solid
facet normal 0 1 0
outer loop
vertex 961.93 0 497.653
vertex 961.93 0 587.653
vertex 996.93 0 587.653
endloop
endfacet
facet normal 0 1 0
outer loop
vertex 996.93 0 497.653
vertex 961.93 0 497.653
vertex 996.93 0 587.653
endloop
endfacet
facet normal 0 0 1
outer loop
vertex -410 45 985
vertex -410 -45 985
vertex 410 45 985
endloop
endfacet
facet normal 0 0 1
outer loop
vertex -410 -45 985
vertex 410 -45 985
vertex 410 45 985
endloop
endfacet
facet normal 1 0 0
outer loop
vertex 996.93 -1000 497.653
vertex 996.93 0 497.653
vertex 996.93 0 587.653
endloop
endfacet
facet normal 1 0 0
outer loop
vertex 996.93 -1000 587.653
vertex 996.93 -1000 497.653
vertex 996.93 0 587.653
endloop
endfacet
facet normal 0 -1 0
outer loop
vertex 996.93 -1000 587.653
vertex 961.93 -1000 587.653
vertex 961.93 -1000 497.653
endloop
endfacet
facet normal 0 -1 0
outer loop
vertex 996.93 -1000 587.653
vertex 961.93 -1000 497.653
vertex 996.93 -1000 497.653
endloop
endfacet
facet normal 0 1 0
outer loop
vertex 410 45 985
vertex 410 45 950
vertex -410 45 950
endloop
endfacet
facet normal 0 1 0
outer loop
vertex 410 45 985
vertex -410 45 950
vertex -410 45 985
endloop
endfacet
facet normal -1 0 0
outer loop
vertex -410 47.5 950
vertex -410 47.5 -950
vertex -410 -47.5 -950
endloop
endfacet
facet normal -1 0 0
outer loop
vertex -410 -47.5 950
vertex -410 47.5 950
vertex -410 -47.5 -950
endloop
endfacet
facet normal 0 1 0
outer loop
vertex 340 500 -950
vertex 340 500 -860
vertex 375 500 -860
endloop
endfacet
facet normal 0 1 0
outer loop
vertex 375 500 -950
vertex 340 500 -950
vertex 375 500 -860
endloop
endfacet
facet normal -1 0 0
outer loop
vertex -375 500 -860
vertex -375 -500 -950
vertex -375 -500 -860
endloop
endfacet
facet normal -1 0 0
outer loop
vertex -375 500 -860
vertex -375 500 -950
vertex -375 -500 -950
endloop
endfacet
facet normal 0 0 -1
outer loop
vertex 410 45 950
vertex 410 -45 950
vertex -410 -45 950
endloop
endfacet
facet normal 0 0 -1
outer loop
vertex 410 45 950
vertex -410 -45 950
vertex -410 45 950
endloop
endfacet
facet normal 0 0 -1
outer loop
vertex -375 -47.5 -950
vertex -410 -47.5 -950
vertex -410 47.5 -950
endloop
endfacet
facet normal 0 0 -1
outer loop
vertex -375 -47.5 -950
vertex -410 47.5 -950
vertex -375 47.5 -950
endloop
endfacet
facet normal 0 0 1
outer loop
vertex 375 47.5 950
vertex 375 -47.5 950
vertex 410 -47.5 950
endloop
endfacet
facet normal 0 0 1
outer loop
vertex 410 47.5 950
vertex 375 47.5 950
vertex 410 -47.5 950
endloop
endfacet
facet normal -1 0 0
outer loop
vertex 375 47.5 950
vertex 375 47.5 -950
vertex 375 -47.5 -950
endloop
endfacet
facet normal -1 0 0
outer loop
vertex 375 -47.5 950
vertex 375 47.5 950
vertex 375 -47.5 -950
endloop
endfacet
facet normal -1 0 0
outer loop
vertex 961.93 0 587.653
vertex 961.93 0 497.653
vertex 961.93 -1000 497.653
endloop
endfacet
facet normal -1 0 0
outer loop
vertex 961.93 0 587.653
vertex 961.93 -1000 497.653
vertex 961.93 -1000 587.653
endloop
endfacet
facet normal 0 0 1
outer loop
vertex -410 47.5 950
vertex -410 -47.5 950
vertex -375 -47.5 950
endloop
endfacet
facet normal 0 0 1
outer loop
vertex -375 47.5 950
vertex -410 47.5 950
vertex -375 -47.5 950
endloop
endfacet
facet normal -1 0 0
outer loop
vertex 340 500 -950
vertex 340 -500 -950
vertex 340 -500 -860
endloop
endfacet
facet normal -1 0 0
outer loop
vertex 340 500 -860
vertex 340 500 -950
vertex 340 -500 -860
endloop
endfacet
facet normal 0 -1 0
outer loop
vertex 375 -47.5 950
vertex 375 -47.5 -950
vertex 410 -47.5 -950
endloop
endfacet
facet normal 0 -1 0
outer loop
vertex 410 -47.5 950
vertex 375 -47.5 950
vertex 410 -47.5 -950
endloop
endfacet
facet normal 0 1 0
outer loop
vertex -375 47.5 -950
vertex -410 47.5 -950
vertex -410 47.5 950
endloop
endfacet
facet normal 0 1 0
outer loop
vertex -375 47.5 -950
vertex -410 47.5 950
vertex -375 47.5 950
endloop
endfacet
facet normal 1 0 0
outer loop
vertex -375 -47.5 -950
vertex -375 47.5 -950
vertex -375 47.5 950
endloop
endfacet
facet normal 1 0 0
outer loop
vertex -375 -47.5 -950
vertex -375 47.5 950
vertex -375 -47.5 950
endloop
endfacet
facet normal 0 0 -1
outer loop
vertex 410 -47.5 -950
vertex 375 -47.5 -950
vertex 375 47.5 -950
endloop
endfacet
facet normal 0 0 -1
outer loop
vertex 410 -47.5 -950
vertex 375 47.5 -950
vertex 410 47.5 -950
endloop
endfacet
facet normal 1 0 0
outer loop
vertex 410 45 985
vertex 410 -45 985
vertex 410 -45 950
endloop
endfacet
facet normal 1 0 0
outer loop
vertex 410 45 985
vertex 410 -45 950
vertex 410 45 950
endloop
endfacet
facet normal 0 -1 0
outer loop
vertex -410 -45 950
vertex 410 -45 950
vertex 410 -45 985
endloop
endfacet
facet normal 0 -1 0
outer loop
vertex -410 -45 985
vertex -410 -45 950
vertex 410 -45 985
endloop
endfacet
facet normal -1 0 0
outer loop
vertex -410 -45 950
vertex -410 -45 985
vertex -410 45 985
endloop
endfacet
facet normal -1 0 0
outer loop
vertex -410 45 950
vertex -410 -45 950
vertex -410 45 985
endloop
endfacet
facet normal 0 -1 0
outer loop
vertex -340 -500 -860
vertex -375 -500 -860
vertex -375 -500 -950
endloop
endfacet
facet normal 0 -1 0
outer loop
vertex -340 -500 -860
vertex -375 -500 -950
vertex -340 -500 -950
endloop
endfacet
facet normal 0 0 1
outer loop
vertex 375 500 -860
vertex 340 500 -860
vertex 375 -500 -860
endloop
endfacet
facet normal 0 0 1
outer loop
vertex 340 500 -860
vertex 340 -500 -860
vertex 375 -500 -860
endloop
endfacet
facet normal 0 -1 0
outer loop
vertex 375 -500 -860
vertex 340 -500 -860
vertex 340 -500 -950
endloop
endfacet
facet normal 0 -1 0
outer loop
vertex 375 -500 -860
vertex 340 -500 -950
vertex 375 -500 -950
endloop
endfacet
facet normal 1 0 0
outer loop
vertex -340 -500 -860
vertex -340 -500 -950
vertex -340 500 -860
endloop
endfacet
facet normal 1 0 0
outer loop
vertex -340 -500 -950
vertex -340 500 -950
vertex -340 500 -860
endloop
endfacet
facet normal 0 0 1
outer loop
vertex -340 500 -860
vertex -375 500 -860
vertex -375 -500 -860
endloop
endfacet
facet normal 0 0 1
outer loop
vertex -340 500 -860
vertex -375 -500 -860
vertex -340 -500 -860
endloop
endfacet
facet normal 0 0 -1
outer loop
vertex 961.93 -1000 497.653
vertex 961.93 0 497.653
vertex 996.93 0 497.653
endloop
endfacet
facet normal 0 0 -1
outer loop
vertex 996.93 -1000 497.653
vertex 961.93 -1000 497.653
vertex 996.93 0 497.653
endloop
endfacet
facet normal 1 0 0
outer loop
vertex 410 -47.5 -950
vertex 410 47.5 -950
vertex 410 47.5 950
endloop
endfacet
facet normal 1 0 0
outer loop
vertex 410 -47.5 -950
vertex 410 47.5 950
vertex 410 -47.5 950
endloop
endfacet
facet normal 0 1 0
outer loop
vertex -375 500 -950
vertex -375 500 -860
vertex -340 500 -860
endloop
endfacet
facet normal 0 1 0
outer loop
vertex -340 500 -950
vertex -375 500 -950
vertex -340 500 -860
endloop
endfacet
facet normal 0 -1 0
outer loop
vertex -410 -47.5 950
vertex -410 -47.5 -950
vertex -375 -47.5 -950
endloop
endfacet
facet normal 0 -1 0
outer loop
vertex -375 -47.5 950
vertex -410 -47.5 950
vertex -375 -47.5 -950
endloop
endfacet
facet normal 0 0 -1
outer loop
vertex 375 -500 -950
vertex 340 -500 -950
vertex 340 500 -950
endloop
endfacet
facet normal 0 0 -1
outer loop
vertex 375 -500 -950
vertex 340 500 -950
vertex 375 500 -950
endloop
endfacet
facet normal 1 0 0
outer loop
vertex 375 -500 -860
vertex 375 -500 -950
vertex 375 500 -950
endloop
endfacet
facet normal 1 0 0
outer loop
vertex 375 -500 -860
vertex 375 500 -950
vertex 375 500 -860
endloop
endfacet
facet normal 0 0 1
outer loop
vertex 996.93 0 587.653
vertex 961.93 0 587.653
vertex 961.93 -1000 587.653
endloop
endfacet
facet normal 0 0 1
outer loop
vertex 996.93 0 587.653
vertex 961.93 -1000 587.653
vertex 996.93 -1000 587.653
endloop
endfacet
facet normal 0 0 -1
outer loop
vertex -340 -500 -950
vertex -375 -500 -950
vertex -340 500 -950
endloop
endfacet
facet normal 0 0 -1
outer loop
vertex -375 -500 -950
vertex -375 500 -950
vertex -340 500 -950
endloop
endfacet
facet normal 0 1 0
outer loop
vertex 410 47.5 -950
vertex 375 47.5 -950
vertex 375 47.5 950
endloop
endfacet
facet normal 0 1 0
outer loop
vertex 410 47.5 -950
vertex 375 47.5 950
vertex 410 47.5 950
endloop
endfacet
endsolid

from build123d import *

# Parameters (mm, degrees)
F0_W          = 35
F0_H          = 90
F1_DEPTH      = 1000
F2_DEPTH      = 500
F4_W          = 35
F4_H          = 95
F5_DEPTH      = 1900
F6_W          = 90
F6_H          = 35
F7_DEPTH      = 410
F7_DEPTH_BACK = 410


with BuildPart() as f1:
    # F0 (on Front) → F1 (new body)
    with BuildSketch(Plane.XZ):
        with Locations((979.430446, 542.652875)):
            Rectangle(F0_W, F0_H)
    extrude(amount=F1_DEPTH)


with BuildPart() as f2:
    # F0 (on Front) → F2 (new body, symmetric)
    with BuildSketch(Plane.XZ):
        with Locations((-357.5, -905)):
            Rectangle(F0_W, F0_H)
        with Locations((357.5, -905)):
            Rectangle(F0_W, F0_H)
    extrude(amount=F2_DEPTH, both=True)


with BuildPart() as f5:
    # F4 (on face) → F5 (new body, through all)
    with BuildSketch(Plane(origin=(0, 0, -950), x_dir=(1, 0, 0), z_dir=(0, 0, -1))):
        with Locations((392.5, 0)):
            Rectangle(F4_W, F4_H)
        with Locations((-392.5, 0)):
            Rectangle(F4_W, F4_H)
    extrude(amount=-F5_DEPTH)


with BuildPart() as f7:
    # F6 (on Right) → F7 (new body, two sides)
    with BuildSketch(Plane.YZ) as f7_sk:
        with Locations((0, 967.5)):
            Rectangle(F6_W, F6_H)
    extrude(amount=F7_DEPTH)
    extrude(f7_sk.sketch, amount=-F7_DEPTH_BACK)


solid = Compound([f1.part, f2.part, f5.part, f7.part])
